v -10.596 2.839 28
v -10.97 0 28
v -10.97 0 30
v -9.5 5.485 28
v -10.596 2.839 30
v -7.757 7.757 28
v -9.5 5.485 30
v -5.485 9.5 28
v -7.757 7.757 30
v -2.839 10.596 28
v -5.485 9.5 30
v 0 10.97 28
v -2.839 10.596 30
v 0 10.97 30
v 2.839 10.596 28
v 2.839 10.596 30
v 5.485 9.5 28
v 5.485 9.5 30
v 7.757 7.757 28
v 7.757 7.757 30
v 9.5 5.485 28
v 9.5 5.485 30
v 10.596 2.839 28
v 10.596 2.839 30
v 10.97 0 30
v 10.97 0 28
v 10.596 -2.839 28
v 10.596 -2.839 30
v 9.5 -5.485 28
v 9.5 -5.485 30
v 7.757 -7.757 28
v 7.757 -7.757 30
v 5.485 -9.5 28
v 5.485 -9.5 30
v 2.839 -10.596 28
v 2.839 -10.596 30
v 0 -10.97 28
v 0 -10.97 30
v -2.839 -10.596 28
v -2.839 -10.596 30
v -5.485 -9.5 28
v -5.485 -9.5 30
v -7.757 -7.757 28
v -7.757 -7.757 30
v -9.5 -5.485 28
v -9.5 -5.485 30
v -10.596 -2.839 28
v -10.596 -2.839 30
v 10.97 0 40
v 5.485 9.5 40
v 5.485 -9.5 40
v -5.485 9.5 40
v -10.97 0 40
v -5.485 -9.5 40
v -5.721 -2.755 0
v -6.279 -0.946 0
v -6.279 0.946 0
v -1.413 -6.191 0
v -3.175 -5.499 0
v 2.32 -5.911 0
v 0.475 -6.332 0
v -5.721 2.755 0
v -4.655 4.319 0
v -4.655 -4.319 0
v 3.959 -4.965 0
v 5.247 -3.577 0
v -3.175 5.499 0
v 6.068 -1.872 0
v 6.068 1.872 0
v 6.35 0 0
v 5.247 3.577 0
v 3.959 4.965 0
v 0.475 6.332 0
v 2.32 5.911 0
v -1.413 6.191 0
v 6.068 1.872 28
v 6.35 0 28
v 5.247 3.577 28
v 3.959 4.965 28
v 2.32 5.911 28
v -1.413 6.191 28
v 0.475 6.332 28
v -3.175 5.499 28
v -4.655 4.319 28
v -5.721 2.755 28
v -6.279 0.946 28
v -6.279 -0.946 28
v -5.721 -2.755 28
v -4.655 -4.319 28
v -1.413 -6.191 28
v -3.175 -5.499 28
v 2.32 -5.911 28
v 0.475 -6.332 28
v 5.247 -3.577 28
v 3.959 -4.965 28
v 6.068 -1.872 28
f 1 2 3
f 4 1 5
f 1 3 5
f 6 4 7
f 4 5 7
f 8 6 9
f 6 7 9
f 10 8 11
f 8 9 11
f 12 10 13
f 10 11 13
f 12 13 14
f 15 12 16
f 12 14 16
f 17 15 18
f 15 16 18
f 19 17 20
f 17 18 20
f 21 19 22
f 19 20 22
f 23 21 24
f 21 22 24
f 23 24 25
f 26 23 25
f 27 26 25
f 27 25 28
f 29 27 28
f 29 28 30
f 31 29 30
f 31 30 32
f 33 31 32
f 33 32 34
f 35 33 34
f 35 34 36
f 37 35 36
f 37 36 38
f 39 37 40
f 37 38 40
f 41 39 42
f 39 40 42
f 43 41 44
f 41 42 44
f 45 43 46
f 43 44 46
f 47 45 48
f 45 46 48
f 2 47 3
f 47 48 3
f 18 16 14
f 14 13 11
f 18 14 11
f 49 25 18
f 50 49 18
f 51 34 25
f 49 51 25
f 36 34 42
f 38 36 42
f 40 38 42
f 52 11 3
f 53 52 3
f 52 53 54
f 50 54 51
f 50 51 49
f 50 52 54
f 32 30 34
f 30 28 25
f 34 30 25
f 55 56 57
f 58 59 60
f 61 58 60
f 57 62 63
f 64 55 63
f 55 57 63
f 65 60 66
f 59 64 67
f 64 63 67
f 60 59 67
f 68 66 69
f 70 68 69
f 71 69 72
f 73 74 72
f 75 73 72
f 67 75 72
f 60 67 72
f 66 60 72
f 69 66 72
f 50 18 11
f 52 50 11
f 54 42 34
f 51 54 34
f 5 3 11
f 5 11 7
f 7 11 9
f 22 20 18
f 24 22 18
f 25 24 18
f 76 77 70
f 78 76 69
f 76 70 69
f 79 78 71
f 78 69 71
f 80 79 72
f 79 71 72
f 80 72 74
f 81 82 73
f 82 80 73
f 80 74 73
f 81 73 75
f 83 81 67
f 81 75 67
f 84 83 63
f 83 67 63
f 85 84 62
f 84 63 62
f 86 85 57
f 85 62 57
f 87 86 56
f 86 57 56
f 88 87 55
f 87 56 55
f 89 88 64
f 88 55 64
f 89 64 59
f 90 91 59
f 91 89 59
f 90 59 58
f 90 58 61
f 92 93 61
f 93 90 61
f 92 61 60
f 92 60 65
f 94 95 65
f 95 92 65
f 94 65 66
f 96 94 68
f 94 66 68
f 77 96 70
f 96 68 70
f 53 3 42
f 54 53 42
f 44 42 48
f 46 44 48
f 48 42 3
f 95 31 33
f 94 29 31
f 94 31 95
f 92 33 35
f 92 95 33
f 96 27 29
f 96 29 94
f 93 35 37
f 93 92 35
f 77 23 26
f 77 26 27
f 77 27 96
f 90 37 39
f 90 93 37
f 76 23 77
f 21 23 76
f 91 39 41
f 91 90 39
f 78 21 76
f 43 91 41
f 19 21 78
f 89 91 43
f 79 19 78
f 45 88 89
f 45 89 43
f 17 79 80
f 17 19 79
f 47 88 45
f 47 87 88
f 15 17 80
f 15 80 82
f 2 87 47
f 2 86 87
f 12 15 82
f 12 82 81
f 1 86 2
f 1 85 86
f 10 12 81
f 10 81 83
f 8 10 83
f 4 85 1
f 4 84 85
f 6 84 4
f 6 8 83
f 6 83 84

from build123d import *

# Parameters (mm, degrees)
CROQUIS1_R              = 6.35
SALIENTE_EXTRUIR1_DEPTH = 30
SALIENTE_EXTRUIR2_DEPTH = 10
CROQUIS3_R              = 10.969655115
SALIENTE_EXTRUIR3_DEPTH = 2


with BuildPart() as part:
    # Croquis1 → Saliente-Extruir1 (new body)
    with BuildSketch(Plane.XY):
        Circle(CROQUIS1_R)
    extrude(amount=SALIENTE_EXTRUIR1_DEPTH)

    # Croquis2 → Saliente-Extruir2 (add)
    with BuildSketch(Plane.XY.offset(30)):
        Polygon((10.969655115, 0), (5.484827557, 9.5), (-5.484827557, 9.5), (-10.969655115, 0), (-5.484827557, -9.5), (5.484827557, -9.5), align=None)
    extrude(amount=SALIENTE_EXTRUIR2_DEPTH)

    # Croquis3 → Saliente-Extruir3 (add)
    with BuildSketch(Plane(origin=(0, 0, 30), x_dir=(-1, 0, 0), z_dir=(0, 0, -1))):
        Circle(CROQUIS3_R)
    extrude(amount=SALIENTE_EXTRUIR3_DEPTH)


solid = part.part
